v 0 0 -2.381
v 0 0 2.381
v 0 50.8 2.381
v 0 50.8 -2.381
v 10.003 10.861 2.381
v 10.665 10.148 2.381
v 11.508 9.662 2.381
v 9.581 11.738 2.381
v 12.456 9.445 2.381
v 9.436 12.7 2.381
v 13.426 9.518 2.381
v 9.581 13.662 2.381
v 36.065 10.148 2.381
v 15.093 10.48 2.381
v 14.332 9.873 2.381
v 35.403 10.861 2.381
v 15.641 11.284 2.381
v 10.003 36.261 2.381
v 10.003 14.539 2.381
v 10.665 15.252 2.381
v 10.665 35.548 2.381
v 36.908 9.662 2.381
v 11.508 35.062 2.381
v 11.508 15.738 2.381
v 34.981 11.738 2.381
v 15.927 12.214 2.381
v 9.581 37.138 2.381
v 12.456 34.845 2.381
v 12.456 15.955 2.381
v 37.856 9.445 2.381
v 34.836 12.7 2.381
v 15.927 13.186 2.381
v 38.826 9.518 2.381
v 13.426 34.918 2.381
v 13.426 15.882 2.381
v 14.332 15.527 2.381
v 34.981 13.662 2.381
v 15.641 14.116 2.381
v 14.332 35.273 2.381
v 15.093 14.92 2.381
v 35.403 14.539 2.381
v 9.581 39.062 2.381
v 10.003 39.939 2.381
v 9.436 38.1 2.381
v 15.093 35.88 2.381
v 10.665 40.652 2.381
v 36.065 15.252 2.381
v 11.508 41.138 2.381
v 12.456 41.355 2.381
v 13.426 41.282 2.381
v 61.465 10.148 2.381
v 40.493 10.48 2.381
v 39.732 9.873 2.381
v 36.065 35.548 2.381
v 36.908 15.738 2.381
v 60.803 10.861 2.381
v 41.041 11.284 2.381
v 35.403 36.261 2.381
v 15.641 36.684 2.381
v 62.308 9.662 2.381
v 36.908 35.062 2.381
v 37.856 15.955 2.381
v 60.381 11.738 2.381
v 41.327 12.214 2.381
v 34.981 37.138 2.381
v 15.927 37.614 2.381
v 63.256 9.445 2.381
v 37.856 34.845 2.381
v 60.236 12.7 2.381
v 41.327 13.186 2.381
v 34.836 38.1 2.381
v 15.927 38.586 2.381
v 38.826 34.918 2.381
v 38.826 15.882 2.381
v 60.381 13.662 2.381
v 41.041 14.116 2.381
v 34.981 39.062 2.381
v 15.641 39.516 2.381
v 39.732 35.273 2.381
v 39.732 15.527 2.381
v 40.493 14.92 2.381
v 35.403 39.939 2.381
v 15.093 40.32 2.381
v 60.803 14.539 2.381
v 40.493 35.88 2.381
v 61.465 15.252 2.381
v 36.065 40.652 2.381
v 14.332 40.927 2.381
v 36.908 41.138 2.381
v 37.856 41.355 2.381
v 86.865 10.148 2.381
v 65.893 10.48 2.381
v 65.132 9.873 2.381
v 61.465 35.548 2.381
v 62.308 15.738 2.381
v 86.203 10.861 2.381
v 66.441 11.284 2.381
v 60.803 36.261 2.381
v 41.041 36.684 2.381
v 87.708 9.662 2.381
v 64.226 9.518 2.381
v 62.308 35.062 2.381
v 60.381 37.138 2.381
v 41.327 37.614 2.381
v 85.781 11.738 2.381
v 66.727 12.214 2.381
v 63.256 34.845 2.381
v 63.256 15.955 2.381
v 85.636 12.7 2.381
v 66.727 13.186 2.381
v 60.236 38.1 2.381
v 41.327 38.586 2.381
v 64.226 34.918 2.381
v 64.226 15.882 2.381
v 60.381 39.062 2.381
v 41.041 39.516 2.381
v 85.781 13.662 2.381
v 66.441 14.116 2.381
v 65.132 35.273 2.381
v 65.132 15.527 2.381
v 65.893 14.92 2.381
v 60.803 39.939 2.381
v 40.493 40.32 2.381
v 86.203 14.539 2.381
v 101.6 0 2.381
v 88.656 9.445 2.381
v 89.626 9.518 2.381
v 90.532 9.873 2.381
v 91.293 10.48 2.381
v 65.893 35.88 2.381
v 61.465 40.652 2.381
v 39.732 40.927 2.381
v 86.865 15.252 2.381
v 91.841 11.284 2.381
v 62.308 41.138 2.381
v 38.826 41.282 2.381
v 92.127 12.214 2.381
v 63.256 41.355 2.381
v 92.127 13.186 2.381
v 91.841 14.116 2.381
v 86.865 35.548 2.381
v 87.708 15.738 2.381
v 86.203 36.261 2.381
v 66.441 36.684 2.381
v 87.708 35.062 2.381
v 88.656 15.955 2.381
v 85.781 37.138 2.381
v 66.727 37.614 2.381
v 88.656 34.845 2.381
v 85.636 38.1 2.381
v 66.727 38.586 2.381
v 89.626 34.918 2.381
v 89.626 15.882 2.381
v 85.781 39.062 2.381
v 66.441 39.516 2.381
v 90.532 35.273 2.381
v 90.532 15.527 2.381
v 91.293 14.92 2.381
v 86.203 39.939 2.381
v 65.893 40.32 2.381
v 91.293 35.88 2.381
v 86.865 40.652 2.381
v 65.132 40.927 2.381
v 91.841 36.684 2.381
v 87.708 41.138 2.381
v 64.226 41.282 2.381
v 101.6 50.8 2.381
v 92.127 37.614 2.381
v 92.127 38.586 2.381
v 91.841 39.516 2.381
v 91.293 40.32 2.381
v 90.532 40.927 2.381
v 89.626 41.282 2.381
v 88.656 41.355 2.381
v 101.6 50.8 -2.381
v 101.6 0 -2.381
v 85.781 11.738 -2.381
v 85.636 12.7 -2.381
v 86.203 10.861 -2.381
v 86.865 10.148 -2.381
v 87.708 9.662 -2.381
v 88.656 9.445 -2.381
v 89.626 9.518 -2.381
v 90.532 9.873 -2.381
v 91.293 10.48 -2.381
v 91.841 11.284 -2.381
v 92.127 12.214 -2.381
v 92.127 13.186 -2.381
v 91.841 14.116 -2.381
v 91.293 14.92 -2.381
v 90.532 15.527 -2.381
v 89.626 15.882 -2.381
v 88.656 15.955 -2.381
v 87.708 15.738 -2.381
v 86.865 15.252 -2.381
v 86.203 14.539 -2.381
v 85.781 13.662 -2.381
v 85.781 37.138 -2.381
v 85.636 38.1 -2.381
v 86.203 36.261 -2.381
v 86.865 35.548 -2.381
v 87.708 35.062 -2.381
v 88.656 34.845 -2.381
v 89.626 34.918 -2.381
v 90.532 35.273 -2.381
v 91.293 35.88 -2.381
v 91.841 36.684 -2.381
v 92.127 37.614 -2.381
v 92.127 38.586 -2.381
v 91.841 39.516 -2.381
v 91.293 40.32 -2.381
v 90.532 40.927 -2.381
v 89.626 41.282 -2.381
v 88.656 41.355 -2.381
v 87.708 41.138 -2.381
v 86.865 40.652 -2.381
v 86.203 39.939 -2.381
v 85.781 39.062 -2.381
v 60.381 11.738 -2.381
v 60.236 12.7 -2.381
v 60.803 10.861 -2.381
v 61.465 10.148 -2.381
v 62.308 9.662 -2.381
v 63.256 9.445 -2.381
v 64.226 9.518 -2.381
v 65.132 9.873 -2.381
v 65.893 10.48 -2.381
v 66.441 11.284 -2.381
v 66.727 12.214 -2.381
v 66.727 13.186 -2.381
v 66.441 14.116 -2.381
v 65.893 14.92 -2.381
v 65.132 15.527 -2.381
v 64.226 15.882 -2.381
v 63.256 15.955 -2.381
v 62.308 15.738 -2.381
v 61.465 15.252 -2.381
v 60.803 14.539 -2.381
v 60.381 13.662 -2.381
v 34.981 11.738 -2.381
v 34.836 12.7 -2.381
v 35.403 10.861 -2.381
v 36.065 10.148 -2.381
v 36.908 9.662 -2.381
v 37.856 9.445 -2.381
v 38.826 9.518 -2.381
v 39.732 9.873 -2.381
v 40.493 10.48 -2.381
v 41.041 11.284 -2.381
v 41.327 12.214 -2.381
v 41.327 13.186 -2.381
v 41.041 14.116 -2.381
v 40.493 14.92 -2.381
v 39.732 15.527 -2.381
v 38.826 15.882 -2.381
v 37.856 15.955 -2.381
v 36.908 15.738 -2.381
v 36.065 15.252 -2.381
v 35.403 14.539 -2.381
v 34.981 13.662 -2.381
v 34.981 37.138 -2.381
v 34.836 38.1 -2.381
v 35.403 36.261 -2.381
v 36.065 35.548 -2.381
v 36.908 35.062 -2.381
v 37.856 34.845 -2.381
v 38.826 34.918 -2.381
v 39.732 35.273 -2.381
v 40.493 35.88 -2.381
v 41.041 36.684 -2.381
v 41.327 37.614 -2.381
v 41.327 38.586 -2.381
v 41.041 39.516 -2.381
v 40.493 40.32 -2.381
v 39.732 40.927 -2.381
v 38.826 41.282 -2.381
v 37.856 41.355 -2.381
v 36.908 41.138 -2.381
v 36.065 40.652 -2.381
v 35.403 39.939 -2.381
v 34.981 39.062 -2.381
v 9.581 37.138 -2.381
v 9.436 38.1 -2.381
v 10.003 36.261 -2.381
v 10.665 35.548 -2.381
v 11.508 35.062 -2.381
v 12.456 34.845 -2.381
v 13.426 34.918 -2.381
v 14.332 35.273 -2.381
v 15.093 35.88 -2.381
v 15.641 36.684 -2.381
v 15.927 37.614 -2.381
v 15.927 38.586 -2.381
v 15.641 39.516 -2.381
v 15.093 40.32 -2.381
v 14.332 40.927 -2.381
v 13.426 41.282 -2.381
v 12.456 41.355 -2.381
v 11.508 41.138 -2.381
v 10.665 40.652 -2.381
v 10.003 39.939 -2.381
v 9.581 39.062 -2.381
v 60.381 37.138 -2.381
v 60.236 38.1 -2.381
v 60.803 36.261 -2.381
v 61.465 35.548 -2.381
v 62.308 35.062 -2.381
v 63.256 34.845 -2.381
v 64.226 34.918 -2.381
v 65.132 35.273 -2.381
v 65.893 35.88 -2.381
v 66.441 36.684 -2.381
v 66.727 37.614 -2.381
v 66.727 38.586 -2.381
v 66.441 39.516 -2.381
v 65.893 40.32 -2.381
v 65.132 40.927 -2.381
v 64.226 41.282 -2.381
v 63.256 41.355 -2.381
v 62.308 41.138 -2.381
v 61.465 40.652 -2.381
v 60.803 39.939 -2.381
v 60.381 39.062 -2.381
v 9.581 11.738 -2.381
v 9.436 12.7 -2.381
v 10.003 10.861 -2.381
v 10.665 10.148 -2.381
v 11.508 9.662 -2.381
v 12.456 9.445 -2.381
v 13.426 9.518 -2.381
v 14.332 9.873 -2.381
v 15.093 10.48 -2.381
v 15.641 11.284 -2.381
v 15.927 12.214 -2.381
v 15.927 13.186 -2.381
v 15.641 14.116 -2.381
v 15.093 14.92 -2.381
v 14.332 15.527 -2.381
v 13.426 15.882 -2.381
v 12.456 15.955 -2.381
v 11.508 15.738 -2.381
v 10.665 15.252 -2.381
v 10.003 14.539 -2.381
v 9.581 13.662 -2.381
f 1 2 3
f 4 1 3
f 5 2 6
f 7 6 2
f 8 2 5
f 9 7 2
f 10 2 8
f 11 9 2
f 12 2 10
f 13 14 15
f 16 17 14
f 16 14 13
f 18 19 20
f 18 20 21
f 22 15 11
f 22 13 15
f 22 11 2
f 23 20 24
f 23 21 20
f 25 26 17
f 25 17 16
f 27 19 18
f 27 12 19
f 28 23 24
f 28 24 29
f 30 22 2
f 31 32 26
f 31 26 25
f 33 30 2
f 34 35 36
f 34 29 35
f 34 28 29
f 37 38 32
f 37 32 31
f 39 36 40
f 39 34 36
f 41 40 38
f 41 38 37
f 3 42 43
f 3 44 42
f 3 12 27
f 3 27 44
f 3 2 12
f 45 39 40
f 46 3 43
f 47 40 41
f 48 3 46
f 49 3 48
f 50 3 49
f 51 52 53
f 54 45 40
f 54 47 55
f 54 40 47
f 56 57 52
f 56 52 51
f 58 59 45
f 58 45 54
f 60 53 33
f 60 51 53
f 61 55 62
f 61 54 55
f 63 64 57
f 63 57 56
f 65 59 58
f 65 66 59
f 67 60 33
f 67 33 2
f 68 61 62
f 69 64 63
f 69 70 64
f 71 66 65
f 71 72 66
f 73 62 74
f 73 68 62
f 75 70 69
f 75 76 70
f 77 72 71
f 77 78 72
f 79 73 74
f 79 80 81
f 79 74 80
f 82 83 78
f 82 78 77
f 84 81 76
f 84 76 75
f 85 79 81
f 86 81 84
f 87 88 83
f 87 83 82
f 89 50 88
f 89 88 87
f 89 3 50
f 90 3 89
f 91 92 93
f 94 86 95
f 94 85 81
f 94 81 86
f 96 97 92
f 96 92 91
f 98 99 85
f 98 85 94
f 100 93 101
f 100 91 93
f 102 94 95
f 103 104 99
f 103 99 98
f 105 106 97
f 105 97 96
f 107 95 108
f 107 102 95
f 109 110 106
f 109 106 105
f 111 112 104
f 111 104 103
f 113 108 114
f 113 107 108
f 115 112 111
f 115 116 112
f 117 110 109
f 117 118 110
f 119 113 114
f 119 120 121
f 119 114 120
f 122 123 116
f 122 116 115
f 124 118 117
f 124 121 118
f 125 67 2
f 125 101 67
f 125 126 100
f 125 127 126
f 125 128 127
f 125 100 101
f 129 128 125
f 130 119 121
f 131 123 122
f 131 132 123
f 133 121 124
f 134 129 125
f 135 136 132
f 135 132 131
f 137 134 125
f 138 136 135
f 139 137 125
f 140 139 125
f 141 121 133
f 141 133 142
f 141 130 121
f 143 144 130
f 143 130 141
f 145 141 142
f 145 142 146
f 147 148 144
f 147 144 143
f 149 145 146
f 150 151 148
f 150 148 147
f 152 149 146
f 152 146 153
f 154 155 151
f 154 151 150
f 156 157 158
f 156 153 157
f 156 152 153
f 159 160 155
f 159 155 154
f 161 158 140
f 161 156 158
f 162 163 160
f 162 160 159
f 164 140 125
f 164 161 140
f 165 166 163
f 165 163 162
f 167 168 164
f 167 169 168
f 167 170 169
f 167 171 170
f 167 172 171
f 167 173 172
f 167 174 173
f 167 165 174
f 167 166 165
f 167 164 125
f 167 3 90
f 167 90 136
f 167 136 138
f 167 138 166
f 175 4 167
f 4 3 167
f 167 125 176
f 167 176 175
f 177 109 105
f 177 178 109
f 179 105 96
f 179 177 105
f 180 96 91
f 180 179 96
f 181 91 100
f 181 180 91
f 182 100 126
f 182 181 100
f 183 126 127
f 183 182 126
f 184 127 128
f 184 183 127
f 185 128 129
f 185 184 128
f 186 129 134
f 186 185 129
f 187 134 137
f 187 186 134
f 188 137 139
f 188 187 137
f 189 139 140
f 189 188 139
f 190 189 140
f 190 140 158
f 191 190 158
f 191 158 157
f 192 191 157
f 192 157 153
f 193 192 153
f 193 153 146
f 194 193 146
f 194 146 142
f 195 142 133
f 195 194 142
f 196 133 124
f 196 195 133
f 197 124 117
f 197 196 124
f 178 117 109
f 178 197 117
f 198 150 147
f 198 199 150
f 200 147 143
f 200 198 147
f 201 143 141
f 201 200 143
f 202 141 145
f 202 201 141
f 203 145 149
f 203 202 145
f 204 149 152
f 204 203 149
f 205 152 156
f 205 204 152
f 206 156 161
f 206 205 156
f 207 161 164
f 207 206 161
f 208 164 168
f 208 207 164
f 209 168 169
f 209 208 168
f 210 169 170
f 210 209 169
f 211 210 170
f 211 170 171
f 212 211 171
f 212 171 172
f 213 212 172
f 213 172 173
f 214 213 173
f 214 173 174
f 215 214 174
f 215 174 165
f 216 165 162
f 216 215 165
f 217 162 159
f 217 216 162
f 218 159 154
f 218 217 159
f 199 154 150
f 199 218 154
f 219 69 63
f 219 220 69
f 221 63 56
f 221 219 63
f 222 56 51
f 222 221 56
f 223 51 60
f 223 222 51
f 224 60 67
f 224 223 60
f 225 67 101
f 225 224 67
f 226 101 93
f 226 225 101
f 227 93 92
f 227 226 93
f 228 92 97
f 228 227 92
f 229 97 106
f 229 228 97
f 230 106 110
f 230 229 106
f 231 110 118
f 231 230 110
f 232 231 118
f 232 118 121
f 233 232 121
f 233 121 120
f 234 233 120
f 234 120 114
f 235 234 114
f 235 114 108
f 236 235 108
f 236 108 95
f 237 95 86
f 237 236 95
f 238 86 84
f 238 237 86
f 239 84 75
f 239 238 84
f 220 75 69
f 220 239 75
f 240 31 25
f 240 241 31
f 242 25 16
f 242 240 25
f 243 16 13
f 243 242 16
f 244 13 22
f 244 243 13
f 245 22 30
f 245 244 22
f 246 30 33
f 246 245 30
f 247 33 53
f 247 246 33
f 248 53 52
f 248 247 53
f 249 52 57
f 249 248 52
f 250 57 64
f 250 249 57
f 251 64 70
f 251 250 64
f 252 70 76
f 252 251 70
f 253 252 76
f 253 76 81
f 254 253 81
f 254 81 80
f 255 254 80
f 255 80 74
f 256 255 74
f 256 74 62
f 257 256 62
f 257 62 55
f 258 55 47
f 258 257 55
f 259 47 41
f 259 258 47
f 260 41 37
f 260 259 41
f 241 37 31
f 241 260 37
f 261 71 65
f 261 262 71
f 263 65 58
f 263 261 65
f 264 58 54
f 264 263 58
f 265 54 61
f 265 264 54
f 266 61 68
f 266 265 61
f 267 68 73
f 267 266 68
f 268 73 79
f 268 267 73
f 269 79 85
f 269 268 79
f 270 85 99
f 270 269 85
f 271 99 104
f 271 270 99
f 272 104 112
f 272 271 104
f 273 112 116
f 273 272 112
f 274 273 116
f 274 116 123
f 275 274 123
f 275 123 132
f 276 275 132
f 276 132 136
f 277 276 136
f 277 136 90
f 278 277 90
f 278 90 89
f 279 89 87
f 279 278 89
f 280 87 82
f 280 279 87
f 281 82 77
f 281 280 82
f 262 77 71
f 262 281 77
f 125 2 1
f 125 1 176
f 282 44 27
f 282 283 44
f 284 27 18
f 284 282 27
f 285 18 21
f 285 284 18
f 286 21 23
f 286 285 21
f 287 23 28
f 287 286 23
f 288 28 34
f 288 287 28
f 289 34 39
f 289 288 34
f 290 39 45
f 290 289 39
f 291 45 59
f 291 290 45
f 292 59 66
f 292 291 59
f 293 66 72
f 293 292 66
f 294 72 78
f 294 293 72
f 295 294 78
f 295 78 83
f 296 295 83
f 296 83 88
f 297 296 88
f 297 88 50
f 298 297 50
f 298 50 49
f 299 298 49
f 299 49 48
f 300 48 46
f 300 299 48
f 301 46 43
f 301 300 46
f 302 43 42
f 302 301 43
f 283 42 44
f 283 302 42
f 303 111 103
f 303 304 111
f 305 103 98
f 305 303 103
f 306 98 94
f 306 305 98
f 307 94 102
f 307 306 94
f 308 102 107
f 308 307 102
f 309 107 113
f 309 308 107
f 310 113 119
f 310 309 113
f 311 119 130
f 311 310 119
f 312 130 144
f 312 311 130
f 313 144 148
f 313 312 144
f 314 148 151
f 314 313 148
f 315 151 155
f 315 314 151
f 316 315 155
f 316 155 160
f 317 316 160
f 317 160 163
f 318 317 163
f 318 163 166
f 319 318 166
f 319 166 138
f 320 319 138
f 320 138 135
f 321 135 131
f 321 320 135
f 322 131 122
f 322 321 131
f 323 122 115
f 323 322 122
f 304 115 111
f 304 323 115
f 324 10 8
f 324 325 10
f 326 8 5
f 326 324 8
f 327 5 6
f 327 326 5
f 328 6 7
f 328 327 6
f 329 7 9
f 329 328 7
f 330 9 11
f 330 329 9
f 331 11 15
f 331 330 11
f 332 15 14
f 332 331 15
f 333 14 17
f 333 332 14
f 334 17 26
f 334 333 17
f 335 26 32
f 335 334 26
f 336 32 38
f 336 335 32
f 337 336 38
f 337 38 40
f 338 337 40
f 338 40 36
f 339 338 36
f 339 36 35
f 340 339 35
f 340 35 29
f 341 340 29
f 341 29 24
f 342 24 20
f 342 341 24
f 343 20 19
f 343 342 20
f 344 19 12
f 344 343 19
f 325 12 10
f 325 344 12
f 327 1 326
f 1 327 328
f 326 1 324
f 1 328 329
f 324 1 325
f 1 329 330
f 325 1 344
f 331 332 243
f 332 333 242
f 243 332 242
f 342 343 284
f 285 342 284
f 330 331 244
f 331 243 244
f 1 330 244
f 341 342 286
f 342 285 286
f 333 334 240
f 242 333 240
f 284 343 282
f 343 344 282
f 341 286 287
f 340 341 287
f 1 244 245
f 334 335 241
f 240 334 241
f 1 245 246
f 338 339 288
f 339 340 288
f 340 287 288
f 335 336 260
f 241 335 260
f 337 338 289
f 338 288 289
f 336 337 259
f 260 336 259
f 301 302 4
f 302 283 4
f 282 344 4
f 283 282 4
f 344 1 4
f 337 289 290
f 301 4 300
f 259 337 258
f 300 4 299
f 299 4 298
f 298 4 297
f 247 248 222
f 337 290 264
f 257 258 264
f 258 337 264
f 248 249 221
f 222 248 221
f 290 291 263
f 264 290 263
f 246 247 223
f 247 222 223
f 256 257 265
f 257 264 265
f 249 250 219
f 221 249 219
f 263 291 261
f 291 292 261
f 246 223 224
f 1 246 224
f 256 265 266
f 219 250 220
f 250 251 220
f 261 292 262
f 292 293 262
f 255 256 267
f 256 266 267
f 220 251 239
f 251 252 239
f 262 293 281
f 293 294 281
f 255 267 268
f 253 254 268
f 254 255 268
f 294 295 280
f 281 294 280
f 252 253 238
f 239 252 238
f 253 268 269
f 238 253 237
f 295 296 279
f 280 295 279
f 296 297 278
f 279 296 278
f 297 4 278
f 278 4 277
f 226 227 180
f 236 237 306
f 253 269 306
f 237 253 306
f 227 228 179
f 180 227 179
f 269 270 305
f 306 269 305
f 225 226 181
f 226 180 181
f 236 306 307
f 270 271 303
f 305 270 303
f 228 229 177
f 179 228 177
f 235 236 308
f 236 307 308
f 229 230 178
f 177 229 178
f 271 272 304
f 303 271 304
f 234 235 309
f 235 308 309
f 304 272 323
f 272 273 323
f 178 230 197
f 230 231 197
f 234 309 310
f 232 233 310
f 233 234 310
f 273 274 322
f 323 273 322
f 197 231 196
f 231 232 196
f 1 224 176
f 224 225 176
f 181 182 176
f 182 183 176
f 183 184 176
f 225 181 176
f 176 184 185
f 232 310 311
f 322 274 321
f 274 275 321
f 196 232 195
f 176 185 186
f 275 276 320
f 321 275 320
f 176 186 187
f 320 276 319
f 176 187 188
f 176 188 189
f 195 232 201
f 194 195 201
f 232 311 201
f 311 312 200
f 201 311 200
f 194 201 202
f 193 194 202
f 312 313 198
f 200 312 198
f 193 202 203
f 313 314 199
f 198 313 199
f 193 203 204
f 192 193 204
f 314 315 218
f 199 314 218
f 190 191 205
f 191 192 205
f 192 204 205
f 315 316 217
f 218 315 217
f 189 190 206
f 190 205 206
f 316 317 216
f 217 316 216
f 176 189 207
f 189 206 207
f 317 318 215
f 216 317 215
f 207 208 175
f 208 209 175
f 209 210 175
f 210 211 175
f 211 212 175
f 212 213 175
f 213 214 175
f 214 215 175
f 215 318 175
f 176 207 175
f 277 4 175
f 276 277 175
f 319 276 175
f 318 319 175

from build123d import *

# Parameters (mm, degrees)
SKETCH1_W           = 101.6
SKETCH1_H           = 50.8
SKETCH1_R           = 3.2639
BOSS_EXTRUDE1_DEPTH = 2.38125


with BuildPart() as part:
    # Sketch1 → Boss-Extrude1 (new, symmetric)
    with BuildSketch(Plane.XY):
        with Locations((50.8, 25.4)):
            Rectangle(SKETCH1_W, SKETCH1_H)
        with Locations(Location((12.7, 12.7, 0), (0, 0, 180))):
            Circle(SKETCH1_R, mode=Mode.SUBTRACT)
        with Locations(Location((38.1, 12.7, 0), (0, 0, 180))):
            Circle(SKETCH1_R, mode=Mode.SUBTRACT)
        with Locations(Location((63.5, 12.7, 0), (0, 0, 180))):
            Circle(SKETCH1_R, mode=Mode.SUBTRACT)
        with Locations(Location((88.9, 12.7, 0), (0, 0, 180))):
            Circle(SKETCH1_R, mode=Mode.SUBTRACT)
        with Locations(Location((12.7, 38.1, 0), (0, 0, 180))):
            Circle(SKETCH1_R, mode=Mode.SUBTRACT)
        with Locations(Location((38.1, 38.1, 0), (0, 0, 180))):
            Circle(SKETCH1_R, mode=Mode.SUBTRACT)
        with Locations(Location((63.5, 38.1, 0), (0, 0, 180))):
            Circle(SKETCH1_R, mode=Mode.SUBTRACT)
        with Locations(Location((88.9, 38.1, 0), (0, 0, 180))):
            Circle(SKETCH1_R, mode=Mode.SUBTRACT)
    extrude(amount=BOSS_EXTRUDE1_DEPTH, both=True)


solid = part.part
